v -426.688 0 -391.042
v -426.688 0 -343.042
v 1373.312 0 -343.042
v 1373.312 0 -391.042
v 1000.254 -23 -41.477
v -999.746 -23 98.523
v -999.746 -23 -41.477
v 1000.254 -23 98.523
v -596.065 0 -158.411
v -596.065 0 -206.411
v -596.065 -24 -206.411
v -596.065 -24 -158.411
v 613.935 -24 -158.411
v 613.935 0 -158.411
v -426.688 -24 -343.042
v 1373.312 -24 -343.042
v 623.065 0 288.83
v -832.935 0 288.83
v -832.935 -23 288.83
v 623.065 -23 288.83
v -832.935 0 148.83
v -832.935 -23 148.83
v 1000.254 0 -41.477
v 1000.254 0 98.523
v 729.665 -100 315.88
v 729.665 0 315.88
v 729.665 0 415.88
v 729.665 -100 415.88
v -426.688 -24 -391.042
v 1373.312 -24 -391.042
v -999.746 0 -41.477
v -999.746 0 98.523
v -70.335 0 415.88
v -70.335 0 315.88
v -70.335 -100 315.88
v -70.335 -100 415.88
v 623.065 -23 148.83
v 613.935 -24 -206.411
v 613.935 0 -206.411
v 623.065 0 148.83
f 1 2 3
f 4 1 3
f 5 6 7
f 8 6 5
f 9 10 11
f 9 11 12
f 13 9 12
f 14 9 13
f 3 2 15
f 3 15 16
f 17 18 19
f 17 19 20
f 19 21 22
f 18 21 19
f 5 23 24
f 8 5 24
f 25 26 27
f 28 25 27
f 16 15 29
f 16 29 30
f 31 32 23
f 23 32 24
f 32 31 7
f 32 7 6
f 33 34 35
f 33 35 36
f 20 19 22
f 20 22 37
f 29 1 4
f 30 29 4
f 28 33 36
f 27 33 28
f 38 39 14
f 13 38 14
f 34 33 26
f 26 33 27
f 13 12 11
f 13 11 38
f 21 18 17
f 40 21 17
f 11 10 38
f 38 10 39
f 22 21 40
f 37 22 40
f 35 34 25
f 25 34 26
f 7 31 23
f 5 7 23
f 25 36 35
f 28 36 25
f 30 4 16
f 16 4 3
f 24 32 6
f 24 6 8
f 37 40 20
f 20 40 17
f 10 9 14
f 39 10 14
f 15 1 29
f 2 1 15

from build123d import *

# Parameters (mm, degrees)
F0_W     = 2000
F0_H     = 140
F1_DEPTH = 23
F2_W     = 1456
F2_H     = 140
F3_DEPTH = 23
F4_W     = 800
F4_H     = 100
F5_DEPTH = 100
F6_W     = 1800
F6_H     = 48
F7_DEPTH = 24
F8_W     = 1210
F8_H     = 48
F9_DEPTH = 24


with BuildPart() as f1:
    # F0 (on Front) → F1 (new body)
    with BuildSketch(Plane.XZ):
        with Locations((0.254404, 28.522527)):
            Rectangle(F0_W, F0_H)
    extrude(amount=F1_DEPTH)


with BuildPart() as f3:
    # F2 (on Front) → F3 (new body)
    with BuildSketch(Plane.XZ):
        with Locations((-104.935052, 218.829983)):
            Rectangle(F2_W, F2_H)
    extrude(amount=F3_DEPTH)


with BuildPart() as f5:
    # F4 (on Front) → F5 (new body)
    with BuildSketch(Plane.XZ):
        with Locations((329.664744, 365.880244)):
            Rectangle(F4_W, F4_H)
    extrude(amount=F5_DEPTH)


with BuildPart() as f7:
    # F6 (on Front) → F7 (new body)
    with BuildSketch(Plane.XZ):
        with Locations((473.31171, -367.04233)):
            Rectangle(F6_W, F6_H)
    extrude(amount=F7_DEPTH)


with BuildPart() as f9:
    # F8 (on Front) → F9 (new body)
    with BuildSketch(Plane.XZ):
        with Locations((8.934892, -182.410829)):
            Rectangle(F8_W, F8_H)
    extrude(amount=F9_DEPTH)


solid = Compound([f1.part, f3.part, f5.part, f7.part, f9.part])
